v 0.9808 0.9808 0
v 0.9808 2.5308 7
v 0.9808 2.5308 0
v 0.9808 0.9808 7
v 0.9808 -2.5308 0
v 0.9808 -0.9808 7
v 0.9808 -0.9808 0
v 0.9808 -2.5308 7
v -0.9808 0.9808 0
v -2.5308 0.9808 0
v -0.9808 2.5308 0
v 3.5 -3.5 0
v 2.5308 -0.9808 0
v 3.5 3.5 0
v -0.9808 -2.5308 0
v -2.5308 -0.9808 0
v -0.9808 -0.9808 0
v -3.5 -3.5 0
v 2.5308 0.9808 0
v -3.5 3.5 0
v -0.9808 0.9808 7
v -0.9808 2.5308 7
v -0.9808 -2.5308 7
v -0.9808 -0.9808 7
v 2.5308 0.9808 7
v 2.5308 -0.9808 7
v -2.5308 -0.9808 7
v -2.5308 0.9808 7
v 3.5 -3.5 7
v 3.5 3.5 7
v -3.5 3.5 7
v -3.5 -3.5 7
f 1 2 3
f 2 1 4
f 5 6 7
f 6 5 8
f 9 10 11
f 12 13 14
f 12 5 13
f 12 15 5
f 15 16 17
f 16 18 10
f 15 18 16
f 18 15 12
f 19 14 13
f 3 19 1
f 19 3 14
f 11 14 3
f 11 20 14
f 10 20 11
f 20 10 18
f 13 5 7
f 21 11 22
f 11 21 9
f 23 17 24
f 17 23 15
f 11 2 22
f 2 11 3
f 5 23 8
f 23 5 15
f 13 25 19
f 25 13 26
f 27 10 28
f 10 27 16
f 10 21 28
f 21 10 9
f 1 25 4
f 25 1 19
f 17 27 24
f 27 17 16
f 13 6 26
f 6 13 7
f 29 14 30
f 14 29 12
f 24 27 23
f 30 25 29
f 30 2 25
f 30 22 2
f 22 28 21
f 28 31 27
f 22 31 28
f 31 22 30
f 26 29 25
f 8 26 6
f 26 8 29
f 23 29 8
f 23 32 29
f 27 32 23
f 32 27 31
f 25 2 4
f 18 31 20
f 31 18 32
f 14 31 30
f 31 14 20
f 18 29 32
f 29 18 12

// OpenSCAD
$fn = 100;
u = 1.6; // One lego unit
play = 0.226*u; // Tolerance of holes
studr = 3*0.5*u; // Radius of stud/pin
beamh = 5*u;
beamw = 5*u;

ZEROISH = 0.000000000000001;

// Body of lego beam without holes
module beambody(length){
	translate([0, 0, beamh/2])
	minkowski() {
		cube([ZEROISH,
				length*5*u - beamw,
				beamh],
			center = true);
		cylinder(ZEROISH, beamw/2, beamw/2);
	}
}

// Cutouts for stud/pin holes in beams
module studhole(length=1){
	r = studr+play/2;
	R = 3.5*0.5*u;
	cylinder(beamh*u, r, r);
	for (i = [0, beamh-0.5*u]) {
		translate([0,0,i]) cylinder(0.5*u, R, R);
	}
}


// Beam with holes
module beam(length) {
	difference(){
		translate([0, length*5*u/2, 0])
			beambody(length);
		for (i = [0 : length-1]) {
			pos = (2.5 + 5*i) * u;
			translate([0, pos, 0]) studhole();
		}
	}
}

// L shaped beam
module lbeam(length=4, width=3) {
	translate([0, -4, 0]) beam(length);
	rotate([0, 0, 90]) translate([0, -4, 0]) beam(width);
}

// Axle
module axle(length=2, hole=false) {
	if (hole) {
		translate([0, 0, length*beamw/2]) {
			cube([u + play, 4.7 + play, length*beamw], center=true);
			cube([4.7 + play, u + play, length*beamw], center=true);
		}
	}
	else {
		translate([0, 0, length*beamw/2]) {
			cube([u, 4.7, length*beamw], center=true);
			cube([4.7, u, length*beamw], center=true);
		}
	}
}

// Cutout for axle holes
module axlehole(length) {
	axle(length, true);
}

difference(){
translate([0,0,3.5]) cube(7,center=true);
axlehole(3);
}
